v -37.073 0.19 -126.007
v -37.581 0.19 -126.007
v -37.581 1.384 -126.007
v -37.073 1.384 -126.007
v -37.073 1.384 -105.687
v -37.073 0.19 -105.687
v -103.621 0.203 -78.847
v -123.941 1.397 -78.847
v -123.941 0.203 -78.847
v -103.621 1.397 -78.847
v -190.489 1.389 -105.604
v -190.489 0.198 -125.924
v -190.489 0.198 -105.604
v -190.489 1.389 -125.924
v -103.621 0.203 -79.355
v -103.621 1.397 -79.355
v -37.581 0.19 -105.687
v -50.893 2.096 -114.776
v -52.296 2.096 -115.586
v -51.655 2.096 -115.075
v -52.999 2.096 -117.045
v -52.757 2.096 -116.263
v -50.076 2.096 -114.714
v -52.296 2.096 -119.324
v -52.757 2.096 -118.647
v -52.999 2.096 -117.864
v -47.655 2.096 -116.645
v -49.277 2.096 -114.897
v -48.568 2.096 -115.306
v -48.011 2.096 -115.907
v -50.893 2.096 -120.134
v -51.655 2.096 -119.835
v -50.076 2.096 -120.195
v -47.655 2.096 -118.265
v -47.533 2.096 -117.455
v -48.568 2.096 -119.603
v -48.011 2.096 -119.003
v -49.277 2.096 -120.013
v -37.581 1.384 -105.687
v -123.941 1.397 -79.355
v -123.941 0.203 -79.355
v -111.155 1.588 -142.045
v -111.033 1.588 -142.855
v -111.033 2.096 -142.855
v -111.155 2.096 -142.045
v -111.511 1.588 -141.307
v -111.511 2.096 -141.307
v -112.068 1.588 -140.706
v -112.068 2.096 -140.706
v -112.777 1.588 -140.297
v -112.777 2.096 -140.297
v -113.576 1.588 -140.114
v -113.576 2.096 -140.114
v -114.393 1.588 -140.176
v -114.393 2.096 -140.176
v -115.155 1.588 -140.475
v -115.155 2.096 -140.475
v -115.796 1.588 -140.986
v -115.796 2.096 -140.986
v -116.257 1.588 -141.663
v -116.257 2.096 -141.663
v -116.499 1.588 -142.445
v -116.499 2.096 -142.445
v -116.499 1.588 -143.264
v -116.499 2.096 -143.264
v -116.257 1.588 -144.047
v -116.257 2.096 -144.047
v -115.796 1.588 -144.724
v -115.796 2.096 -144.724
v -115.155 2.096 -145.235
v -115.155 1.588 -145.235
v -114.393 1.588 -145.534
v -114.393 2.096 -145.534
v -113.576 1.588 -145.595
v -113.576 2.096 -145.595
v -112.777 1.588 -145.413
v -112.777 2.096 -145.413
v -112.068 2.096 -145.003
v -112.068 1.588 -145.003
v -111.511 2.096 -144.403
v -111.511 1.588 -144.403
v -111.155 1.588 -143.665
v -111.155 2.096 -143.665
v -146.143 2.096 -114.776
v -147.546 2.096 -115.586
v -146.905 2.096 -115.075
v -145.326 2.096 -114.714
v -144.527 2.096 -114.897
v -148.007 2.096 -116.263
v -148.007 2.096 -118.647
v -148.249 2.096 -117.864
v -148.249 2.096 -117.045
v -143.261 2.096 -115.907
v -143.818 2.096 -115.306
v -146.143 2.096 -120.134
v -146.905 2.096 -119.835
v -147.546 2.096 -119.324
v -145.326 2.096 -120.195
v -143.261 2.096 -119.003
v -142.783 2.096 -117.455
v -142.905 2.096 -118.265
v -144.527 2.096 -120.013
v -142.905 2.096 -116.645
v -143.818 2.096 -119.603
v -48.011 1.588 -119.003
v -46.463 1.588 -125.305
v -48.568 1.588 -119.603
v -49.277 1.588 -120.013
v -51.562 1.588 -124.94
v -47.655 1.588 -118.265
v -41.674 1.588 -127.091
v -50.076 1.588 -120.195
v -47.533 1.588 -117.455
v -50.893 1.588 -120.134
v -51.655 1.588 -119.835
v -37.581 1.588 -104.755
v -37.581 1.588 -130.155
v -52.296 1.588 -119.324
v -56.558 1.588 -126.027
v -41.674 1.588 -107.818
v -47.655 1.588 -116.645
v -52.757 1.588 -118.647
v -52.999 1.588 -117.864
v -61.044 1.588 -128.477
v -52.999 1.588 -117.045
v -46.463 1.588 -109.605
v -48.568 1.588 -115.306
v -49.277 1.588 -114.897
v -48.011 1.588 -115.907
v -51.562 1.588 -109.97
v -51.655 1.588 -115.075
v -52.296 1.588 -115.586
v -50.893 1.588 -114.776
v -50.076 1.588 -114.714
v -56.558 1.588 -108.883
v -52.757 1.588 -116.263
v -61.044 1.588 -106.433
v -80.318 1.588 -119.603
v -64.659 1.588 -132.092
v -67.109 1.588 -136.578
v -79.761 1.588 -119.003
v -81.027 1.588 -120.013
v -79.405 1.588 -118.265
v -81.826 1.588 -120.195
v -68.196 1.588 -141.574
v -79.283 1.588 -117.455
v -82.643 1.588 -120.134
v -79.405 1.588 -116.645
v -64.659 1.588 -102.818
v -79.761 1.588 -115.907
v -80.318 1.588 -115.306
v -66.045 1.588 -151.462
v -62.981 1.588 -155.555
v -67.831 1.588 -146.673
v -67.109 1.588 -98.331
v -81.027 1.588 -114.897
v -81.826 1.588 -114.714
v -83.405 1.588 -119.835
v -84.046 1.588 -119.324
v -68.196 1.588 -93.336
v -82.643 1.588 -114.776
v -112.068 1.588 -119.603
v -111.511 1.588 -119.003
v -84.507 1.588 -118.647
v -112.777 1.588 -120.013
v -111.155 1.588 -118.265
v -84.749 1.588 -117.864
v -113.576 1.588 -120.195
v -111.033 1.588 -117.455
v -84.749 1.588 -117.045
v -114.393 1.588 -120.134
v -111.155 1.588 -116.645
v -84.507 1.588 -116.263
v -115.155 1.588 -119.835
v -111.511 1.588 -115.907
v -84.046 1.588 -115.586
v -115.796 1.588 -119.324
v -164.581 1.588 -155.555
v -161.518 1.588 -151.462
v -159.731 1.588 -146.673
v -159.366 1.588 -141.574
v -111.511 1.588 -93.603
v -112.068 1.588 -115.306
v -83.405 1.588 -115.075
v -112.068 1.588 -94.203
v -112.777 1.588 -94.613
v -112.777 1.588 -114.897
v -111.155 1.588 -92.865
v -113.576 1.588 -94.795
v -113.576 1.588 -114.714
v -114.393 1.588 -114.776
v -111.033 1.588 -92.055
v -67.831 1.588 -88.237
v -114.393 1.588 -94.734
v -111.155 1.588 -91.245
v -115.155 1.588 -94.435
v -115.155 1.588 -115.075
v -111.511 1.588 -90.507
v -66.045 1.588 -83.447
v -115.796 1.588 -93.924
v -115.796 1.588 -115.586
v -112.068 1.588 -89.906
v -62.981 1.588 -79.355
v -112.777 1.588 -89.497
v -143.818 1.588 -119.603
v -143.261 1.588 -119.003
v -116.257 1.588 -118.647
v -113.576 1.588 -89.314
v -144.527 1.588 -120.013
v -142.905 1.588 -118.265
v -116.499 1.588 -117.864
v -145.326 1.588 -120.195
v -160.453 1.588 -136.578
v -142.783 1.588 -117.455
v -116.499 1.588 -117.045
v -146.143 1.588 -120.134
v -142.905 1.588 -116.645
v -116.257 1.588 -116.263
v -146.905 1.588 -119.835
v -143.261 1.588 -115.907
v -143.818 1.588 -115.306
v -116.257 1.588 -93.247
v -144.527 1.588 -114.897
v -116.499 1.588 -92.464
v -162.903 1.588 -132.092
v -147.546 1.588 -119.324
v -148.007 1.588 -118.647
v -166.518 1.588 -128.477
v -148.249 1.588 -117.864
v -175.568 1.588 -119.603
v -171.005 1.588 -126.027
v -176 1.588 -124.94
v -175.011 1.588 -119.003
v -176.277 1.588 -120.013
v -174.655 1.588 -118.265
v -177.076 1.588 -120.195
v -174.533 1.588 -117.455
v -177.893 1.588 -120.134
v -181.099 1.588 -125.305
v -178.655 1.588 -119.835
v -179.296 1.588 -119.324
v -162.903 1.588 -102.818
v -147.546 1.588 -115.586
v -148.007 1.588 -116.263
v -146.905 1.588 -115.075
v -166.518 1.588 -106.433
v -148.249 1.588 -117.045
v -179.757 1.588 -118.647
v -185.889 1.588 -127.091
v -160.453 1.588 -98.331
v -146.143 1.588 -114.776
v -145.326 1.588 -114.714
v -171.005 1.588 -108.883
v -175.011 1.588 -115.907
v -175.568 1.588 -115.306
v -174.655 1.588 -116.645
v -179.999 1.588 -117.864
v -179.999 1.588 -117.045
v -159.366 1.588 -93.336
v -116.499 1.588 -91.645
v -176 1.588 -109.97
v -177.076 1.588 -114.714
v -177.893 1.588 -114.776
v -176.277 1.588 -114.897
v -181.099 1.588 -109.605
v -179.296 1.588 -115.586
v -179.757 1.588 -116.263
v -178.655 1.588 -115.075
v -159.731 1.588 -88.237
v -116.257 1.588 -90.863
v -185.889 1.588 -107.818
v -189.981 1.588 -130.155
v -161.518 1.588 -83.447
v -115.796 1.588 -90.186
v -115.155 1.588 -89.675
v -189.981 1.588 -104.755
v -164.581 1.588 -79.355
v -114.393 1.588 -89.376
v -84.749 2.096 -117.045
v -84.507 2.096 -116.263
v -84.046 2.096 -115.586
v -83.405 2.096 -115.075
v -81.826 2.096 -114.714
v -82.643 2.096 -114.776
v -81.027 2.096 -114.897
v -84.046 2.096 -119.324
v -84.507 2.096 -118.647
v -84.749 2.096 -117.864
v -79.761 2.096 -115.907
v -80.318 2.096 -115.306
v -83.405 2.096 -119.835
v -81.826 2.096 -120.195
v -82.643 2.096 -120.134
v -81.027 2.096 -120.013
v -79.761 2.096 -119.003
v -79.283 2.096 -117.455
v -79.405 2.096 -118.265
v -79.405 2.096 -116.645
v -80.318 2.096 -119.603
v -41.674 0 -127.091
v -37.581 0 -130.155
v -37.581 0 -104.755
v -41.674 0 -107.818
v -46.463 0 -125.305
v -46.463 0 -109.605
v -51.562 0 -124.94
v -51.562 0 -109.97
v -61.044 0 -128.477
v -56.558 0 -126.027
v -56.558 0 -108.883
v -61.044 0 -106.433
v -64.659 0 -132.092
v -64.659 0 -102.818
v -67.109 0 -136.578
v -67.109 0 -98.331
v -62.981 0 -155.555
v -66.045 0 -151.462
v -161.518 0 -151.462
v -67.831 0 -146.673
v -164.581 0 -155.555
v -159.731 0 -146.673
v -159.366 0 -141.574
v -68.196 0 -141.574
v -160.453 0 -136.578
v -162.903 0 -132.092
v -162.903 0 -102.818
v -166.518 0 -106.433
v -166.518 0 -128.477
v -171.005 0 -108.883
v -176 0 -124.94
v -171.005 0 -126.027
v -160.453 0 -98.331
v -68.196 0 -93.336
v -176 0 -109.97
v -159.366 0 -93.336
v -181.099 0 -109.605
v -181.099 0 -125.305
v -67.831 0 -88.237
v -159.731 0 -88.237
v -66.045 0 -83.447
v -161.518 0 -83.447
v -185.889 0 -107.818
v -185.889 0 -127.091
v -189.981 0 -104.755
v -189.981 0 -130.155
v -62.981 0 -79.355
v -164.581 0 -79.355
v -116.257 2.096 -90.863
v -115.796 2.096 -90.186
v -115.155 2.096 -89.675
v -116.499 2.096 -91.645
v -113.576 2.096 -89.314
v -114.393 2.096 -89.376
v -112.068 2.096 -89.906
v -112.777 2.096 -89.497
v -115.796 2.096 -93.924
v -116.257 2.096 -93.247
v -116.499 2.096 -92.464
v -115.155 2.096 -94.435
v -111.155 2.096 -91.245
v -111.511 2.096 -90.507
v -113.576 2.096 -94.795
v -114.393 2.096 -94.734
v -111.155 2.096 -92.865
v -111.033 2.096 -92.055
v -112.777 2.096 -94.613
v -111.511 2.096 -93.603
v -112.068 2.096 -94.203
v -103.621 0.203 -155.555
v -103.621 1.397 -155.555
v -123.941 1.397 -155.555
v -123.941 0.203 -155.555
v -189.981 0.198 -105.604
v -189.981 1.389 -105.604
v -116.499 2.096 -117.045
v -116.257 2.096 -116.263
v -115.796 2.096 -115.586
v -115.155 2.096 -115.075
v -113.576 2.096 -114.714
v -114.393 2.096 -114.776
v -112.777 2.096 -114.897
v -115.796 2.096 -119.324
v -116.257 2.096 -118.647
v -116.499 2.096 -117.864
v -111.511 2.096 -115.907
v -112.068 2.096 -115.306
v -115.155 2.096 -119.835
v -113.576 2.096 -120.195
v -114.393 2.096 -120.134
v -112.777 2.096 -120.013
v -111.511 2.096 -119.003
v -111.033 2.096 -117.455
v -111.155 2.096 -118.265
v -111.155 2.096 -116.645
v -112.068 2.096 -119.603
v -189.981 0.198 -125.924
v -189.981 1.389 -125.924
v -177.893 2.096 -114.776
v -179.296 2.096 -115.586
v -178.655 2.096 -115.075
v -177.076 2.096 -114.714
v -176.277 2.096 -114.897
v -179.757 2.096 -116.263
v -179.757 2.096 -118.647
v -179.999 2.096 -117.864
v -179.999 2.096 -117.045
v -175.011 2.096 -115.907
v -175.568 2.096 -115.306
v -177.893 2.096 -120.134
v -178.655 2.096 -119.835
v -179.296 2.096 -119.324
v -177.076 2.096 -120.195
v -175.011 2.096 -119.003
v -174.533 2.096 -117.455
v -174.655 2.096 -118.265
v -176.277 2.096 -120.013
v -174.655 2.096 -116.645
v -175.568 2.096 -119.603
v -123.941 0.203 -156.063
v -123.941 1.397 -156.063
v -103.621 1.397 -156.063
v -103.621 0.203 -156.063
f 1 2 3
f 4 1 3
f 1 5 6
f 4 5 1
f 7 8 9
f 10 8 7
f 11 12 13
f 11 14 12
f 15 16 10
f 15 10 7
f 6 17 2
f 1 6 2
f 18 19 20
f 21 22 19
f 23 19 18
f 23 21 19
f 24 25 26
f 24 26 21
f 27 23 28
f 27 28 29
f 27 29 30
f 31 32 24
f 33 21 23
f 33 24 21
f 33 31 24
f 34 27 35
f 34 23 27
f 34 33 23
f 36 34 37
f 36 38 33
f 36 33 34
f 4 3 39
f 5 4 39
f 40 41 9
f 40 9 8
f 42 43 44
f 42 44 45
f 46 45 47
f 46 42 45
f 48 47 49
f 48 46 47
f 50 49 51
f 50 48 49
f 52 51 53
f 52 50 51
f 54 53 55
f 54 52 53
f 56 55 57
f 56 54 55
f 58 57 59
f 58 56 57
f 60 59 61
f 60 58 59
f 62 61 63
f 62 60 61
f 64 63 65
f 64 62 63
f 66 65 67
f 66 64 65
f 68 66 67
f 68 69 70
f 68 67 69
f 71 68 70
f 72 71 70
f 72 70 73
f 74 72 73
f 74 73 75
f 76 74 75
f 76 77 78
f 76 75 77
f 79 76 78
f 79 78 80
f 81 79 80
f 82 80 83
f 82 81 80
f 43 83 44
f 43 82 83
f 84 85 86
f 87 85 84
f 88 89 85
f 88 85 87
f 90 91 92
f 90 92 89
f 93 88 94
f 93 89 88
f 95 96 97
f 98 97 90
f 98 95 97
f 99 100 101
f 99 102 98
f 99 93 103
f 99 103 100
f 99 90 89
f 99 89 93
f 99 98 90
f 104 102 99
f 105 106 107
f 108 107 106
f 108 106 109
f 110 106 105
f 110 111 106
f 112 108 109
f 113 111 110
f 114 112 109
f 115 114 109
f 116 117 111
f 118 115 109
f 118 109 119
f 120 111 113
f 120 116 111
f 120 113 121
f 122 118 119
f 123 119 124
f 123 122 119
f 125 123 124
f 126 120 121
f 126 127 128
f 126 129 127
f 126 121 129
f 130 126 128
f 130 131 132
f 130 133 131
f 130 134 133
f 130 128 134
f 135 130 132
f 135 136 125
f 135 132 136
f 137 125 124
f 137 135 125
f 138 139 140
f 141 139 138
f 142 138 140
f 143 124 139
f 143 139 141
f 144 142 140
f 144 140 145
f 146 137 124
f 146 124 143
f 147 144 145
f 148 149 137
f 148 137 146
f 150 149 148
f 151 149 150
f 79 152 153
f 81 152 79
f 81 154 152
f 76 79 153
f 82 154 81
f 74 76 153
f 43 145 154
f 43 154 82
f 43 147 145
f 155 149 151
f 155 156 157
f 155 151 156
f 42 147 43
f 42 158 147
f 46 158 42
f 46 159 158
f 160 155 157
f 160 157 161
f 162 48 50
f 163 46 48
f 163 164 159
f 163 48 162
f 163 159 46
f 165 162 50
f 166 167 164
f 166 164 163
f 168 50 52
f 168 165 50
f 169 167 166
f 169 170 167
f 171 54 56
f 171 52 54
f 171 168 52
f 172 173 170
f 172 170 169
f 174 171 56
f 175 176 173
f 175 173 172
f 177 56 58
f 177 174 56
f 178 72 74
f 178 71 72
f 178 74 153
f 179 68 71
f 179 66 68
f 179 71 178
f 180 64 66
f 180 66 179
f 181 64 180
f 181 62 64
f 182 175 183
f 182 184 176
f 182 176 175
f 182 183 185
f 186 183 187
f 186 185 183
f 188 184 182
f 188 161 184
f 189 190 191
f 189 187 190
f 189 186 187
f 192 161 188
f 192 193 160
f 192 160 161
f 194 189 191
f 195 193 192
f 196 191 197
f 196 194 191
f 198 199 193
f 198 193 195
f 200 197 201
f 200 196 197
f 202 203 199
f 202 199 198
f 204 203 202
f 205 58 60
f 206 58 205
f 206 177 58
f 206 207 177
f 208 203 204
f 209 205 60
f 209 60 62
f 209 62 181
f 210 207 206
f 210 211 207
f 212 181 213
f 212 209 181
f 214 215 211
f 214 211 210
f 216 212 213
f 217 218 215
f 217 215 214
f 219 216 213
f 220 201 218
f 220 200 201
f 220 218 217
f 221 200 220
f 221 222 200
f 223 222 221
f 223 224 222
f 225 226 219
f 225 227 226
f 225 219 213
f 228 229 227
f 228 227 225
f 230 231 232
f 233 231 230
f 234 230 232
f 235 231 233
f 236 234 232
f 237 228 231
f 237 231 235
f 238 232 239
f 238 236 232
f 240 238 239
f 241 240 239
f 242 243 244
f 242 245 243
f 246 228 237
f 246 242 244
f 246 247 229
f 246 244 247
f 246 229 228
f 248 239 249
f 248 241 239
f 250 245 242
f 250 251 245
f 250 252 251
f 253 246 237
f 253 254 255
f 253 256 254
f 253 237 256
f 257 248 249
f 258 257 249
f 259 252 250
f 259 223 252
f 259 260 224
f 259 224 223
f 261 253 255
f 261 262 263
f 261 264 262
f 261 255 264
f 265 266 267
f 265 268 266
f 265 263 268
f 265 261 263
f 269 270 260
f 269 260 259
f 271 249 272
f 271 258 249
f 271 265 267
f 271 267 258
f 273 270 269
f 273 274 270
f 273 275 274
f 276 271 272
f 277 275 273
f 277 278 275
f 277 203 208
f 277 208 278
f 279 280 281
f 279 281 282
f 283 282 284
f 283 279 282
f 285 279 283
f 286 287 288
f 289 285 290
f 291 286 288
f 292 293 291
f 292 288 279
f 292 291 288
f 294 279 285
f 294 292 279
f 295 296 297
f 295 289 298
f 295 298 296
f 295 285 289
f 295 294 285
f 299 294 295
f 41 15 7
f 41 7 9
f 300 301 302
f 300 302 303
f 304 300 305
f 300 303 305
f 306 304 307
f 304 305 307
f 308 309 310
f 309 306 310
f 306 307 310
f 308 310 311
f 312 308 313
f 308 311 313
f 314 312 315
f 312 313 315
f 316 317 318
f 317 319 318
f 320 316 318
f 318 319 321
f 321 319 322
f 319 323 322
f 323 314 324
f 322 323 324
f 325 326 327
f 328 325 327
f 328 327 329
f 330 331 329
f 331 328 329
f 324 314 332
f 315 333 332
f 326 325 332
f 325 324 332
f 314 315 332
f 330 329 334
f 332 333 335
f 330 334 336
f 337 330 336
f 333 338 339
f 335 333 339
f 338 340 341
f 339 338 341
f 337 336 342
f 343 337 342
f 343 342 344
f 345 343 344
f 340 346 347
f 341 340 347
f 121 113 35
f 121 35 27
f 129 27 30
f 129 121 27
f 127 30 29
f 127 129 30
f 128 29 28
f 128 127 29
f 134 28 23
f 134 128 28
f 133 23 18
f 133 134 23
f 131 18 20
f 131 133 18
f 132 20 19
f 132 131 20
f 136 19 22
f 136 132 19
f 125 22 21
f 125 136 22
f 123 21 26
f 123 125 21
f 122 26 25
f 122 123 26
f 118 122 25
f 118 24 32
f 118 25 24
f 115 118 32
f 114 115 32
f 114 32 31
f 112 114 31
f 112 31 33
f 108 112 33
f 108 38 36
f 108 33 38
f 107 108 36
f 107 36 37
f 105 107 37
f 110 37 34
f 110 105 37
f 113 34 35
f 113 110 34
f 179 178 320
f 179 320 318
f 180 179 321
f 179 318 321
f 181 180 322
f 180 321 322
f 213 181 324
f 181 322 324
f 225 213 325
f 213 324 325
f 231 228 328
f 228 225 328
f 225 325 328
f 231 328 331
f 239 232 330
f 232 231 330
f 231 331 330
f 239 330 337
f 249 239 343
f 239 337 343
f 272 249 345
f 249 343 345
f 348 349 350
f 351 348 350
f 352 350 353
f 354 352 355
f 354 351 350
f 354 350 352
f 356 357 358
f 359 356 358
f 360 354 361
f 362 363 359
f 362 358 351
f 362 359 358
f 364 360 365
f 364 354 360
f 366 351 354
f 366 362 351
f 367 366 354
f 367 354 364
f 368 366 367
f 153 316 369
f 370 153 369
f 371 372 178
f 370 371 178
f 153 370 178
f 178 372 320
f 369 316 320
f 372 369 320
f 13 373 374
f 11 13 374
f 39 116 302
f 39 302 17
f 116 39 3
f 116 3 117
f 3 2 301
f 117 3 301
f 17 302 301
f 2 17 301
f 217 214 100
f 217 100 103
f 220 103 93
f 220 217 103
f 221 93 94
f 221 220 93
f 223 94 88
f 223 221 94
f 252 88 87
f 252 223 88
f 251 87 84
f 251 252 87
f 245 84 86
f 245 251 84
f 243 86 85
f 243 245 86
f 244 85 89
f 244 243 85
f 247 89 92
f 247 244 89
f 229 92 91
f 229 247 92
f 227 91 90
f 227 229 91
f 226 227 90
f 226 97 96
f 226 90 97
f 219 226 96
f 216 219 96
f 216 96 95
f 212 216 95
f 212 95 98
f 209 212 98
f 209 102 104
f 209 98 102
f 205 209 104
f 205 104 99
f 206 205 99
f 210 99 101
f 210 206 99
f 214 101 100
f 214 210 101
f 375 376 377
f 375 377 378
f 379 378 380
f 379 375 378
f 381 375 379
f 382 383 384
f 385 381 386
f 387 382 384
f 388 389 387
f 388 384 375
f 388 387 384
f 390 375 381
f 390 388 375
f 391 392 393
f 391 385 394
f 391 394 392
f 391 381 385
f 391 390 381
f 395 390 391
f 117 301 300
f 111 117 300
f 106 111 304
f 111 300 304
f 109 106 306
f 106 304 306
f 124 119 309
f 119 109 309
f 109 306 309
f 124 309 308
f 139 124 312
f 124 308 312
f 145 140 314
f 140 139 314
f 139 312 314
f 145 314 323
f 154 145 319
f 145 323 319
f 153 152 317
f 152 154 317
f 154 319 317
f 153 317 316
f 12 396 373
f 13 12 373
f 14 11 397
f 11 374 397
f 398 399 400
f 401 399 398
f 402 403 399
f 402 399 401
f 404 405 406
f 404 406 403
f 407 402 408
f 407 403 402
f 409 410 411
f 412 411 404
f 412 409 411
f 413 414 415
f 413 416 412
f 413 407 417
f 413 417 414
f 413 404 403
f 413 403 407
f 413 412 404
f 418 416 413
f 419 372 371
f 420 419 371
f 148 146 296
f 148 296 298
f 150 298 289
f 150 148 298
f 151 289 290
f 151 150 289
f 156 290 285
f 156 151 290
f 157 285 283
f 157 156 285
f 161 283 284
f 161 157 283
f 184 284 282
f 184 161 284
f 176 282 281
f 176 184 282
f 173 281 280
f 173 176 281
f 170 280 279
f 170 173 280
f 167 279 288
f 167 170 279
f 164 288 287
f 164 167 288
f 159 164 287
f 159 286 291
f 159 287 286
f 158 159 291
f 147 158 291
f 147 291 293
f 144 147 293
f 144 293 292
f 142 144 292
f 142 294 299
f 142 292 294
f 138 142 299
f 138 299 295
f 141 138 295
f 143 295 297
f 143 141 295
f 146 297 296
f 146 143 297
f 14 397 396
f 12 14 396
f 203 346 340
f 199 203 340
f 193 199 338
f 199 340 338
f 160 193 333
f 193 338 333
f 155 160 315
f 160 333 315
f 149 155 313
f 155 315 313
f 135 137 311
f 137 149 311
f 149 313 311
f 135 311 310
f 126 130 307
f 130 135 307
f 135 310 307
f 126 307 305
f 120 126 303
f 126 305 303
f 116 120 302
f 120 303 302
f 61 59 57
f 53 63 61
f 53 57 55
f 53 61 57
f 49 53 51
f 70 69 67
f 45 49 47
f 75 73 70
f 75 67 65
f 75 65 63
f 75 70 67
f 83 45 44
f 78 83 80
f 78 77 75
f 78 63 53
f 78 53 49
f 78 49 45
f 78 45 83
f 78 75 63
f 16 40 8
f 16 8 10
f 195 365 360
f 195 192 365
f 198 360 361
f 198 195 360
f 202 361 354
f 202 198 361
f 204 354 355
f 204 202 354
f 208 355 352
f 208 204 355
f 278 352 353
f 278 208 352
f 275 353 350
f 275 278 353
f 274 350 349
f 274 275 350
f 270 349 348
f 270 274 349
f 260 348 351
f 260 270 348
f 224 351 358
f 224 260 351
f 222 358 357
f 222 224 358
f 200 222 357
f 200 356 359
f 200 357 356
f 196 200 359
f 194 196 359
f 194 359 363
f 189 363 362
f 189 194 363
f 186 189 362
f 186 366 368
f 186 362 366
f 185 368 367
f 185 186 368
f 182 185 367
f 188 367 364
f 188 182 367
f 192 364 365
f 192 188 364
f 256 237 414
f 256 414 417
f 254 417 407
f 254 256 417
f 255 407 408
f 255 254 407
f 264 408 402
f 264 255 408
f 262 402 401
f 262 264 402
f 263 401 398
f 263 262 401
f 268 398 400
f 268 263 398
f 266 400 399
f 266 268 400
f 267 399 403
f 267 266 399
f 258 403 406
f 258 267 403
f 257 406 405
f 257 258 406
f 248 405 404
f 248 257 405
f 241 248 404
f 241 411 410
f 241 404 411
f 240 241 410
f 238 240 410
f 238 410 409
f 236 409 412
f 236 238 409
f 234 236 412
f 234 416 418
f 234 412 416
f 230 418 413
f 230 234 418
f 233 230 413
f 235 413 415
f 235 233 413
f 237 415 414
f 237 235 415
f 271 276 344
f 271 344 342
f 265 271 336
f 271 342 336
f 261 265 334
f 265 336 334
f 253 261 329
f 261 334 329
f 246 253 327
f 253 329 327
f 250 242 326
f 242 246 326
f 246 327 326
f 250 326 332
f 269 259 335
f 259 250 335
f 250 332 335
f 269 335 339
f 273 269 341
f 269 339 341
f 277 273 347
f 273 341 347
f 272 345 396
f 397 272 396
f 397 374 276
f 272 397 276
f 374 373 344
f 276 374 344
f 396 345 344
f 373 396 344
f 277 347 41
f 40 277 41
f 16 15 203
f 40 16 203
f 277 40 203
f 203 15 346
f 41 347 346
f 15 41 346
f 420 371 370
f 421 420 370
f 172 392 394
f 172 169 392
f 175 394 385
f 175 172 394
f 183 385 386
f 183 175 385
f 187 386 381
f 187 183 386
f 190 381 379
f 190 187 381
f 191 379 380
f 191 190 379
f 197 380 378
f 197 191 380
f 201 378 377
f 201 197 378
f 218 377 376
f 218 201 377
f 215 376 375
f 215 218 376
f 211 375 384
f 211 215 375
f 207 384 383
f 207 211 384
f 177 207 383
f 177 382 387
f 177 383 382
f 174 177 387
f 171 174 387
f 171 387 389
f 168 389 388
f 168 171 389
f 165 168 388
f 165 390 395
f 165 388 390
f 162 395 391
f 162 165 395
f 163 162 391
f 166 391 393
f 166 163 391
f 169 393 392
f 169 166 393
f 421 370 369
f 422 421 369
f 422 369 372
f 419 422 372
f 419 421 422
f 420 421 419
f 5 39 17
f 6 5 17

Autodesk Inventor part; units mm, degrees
ref_plane "YZ Plane" through (0, 0, 0) normal (1, 0, 0) x (0, 1, 0)
ref_plane "XZ Plane" through (0, 0, 0) normal (0, 1, 0) x (-1, 0, 0)
ref_plane "XY Plane" through (0, 0, 0) normal (0, 0, 1) x (1, 0, 0)
sketch "Sketch1" plane through (0, 0, 0) normal (0, 1, 0) x (-1, 0, 0)
  line L0 (37.5811, -104.7549) -> (37.5811, -130.1549)
  line L1 (62.9811, -155.5549) -> (164.5811, -155.5549)
  line L2 (189.9811, -130.1549) -> (189.9811, -104.7549)
  arc A0 (62.9811, -155.5549) -> (37.5811, -130.1549) centre (50.2811, -142.8549) ccw
  arc A1 (189.9811, -130.1549) -> (164.5811, -155.5549) centre (177.2811, -142.8549) ccw
  arc A2 (164.5811, -79.3549) -> (189.9811, -104.7549) centre (177.2811, -92.0549) ccw
  arc A3 (37.5811, -104.7549) -> (62.9811, -79.3549) centre (50.2811, -92.0549) ccw
  line L3 (164.5811, -79.3549) -> (62.9811, -79.3549)
  point P0 (0, 0)
  dimension "d4" = 17.9605
  dimension "d11" = 17.9605
  dimension "d16" = 25.4
  dimension "d17" = 17.9605
  dimension "d18" = 25.4
  dimension "d19" = 101.6
  dimension "d20" = 17.9605
extrude "Extrusion1" add sketch "Sketch1" along normal blind 1.5875
sketch "Sketch2" plane through (0, 1.5875, 0) normal (0, 1, 0) x (1, 0, 0)
  circle A0 centre (-113.7811, 117.4549) radius 2.7481
  line L0 (-62.9811, 155.5549) -> (-164.5811, 155.5549) projected
  line L1 (-37.5811, 104.7549) -> (-37.5811, 130.1549) projected
  circle A1 centre (-145.5311, 117.4549) radius 2.7481
  circle A2 centre (-177.2811, 117.4549) radius 2.7481
  circle A3 centre (-82.0311, 117.4549) radius 2.7481
  circle A4 centre (-50.2811, 117.4549) radius 2.7481
  circle A5 centre (-113.7811, 142.8549) radius 2.7481
  circle A6 centre (-113.7811, 92.0549) radius 2.7481
  point P0 (0, 0)
  dimension "d23" = 38.1
  dimension "d24" = 76.2
  dimension "d27" = 31.75
  dimension "d34" = 31.75
  dimension "d41" = 25.4
  dimension "d48" = 25.4
extrude "Extrusion2" add sketch "Sketch2" along normal blind 0.508
sketch "Sketch3" plane through (-189.9811, 0, -130.1549) normal (-1, 0, 0) x (0, 0, 1)
  line L0 (24.5513, 1.3891) -> (4.2313, 1.3891)
  line L1 (4.2313, 1.3891) -> (4.2313, 0.1984)
  line L2 (4.2313, 0.1984) -> (24.5513, 0.1984)
  line L3 (24.5513, 0.1984) -> (24.5513, 1.3891)
  line L4 (0, 0) -> (0, 1.5875) projected
  line L5 (0, 0) -> (25.4, 0) projected
  line L6 (25.4, 0) -> (25.4, 1.5875) projected
  line L7 (0, 1.5875) -> (25.4, 1.5875) projected
  point P0 (130.1549, 0)
  dimension "d55" = 1.5875
  dimension "d56" = 25.4
  dimension "d57" = 1.1906
  dimension "d58" = 0.1984
  dimension "d59" = 20.32
sketch "Sketch4" plane through (-37.5811, 0, -104.7549) normal (1, 0, 0) x (0, 0, -1)
  line L0 (0, 1.5875) -> (25.4, 1.5875) projected
  line L1 (0, 0) -> (0, 1.5875) projected
  line L2 (25.4, 0) -> (25.4, 1.5875) projected
  line L3 (0.9323, 0.1905) -> (21.2523, 0.1905)
  line L4 (21.2523, 0.1905) -> (21.2523, 1.3843)
  line L5 (21.2523, 1.3843) -> (0.9323, 1.3843)
  line L6 (0.9323, 1.3843) -> (0.9323, 0.1905)
  point P0 (-104.7549, 0)
  dimension "d60" = 20.32
  dimension "d61" = 1.1938
  dimension "d62" = 0.2032
extrude "Extrusion3" add sketch "Sketch4" along normal blind 0.508
sketch "Sketch5" plane through (-62.9811, 0, -155.5549) normal (0, 0, -1) x (-1, 0, 0)
  line L0 (101.6, 0) -> (101.6, 1.5875) projected
  line L1 (0, 0) -> (0, 1.5875) projected
  line L2 (40.64, 0.2032) -> (60.96, 0.2032)
  line L3 (60.96, 0.2032) -> (60.96, 1.397)
  line L4 (60.96, 1.397) -> (40.64, 1.397)
  line L5 (40.64, 1.397) -> (40.64, 0.2032)
  line L6 (0, 1.5875) -> (101.6, 1.5875) projected
  line L7 (0, 0) -> (101.6, 0) projected
  point P0 (-62.9811, 0)
  dimension "d65" = 20.32
  dimension "d66" = 40.64
  dimension "d67" = 101.6
  dimension "d68" = 40.64
  dimension "d69" = 1.1938
  dimension "d70" = 0.2032
  dimension "d71" = 0.1905
extrude "Extrusion4" add sketch "Sketch5" along normal blind 0.508 contours L5 L4 L3 L2
extrude "Extrusion5" add sketch "Sketch3" along normal blind 0.508 contours L3 L2 L1 L0
sketch "Sketch6" plane through (-164.5811, 0, -79.3549) normal (0, 0, 1) x (1, 0, 0)
  line L0 (101.6, 0) -> (101.6, 1.5875) projected
  line L1 (0, 0) -> (0, 1.5875) projected
  line L2 (60.96, 0.2032) -> (40.64, 0.2032)
  line L3 (40.64, 0.2032) -> (40.64, 1.397)
  line L4 (40.64, 1.397) -> (60.96, 1.397)
  line L5 (60.96, 1.397) -> (60.96, 0.2032)
  line L6 (0, 0) -> (101.6, 0) projected
  point P0 (164.5811, 0)
  dimension "d76" = 20.32
  dimension "d77" = 1.1938
  dimension "d78" = 0.2032
  dimension "d79" = 40.64
extrude "Extrusion6" add sketch "Sketch6" along normal blind 0.508
equation "\"d57\" = 0.75 * d55"
equation "\"d58\" = -0.5 * d57 + 0.5 * d55"
properties part number "FORS phone case- base"
